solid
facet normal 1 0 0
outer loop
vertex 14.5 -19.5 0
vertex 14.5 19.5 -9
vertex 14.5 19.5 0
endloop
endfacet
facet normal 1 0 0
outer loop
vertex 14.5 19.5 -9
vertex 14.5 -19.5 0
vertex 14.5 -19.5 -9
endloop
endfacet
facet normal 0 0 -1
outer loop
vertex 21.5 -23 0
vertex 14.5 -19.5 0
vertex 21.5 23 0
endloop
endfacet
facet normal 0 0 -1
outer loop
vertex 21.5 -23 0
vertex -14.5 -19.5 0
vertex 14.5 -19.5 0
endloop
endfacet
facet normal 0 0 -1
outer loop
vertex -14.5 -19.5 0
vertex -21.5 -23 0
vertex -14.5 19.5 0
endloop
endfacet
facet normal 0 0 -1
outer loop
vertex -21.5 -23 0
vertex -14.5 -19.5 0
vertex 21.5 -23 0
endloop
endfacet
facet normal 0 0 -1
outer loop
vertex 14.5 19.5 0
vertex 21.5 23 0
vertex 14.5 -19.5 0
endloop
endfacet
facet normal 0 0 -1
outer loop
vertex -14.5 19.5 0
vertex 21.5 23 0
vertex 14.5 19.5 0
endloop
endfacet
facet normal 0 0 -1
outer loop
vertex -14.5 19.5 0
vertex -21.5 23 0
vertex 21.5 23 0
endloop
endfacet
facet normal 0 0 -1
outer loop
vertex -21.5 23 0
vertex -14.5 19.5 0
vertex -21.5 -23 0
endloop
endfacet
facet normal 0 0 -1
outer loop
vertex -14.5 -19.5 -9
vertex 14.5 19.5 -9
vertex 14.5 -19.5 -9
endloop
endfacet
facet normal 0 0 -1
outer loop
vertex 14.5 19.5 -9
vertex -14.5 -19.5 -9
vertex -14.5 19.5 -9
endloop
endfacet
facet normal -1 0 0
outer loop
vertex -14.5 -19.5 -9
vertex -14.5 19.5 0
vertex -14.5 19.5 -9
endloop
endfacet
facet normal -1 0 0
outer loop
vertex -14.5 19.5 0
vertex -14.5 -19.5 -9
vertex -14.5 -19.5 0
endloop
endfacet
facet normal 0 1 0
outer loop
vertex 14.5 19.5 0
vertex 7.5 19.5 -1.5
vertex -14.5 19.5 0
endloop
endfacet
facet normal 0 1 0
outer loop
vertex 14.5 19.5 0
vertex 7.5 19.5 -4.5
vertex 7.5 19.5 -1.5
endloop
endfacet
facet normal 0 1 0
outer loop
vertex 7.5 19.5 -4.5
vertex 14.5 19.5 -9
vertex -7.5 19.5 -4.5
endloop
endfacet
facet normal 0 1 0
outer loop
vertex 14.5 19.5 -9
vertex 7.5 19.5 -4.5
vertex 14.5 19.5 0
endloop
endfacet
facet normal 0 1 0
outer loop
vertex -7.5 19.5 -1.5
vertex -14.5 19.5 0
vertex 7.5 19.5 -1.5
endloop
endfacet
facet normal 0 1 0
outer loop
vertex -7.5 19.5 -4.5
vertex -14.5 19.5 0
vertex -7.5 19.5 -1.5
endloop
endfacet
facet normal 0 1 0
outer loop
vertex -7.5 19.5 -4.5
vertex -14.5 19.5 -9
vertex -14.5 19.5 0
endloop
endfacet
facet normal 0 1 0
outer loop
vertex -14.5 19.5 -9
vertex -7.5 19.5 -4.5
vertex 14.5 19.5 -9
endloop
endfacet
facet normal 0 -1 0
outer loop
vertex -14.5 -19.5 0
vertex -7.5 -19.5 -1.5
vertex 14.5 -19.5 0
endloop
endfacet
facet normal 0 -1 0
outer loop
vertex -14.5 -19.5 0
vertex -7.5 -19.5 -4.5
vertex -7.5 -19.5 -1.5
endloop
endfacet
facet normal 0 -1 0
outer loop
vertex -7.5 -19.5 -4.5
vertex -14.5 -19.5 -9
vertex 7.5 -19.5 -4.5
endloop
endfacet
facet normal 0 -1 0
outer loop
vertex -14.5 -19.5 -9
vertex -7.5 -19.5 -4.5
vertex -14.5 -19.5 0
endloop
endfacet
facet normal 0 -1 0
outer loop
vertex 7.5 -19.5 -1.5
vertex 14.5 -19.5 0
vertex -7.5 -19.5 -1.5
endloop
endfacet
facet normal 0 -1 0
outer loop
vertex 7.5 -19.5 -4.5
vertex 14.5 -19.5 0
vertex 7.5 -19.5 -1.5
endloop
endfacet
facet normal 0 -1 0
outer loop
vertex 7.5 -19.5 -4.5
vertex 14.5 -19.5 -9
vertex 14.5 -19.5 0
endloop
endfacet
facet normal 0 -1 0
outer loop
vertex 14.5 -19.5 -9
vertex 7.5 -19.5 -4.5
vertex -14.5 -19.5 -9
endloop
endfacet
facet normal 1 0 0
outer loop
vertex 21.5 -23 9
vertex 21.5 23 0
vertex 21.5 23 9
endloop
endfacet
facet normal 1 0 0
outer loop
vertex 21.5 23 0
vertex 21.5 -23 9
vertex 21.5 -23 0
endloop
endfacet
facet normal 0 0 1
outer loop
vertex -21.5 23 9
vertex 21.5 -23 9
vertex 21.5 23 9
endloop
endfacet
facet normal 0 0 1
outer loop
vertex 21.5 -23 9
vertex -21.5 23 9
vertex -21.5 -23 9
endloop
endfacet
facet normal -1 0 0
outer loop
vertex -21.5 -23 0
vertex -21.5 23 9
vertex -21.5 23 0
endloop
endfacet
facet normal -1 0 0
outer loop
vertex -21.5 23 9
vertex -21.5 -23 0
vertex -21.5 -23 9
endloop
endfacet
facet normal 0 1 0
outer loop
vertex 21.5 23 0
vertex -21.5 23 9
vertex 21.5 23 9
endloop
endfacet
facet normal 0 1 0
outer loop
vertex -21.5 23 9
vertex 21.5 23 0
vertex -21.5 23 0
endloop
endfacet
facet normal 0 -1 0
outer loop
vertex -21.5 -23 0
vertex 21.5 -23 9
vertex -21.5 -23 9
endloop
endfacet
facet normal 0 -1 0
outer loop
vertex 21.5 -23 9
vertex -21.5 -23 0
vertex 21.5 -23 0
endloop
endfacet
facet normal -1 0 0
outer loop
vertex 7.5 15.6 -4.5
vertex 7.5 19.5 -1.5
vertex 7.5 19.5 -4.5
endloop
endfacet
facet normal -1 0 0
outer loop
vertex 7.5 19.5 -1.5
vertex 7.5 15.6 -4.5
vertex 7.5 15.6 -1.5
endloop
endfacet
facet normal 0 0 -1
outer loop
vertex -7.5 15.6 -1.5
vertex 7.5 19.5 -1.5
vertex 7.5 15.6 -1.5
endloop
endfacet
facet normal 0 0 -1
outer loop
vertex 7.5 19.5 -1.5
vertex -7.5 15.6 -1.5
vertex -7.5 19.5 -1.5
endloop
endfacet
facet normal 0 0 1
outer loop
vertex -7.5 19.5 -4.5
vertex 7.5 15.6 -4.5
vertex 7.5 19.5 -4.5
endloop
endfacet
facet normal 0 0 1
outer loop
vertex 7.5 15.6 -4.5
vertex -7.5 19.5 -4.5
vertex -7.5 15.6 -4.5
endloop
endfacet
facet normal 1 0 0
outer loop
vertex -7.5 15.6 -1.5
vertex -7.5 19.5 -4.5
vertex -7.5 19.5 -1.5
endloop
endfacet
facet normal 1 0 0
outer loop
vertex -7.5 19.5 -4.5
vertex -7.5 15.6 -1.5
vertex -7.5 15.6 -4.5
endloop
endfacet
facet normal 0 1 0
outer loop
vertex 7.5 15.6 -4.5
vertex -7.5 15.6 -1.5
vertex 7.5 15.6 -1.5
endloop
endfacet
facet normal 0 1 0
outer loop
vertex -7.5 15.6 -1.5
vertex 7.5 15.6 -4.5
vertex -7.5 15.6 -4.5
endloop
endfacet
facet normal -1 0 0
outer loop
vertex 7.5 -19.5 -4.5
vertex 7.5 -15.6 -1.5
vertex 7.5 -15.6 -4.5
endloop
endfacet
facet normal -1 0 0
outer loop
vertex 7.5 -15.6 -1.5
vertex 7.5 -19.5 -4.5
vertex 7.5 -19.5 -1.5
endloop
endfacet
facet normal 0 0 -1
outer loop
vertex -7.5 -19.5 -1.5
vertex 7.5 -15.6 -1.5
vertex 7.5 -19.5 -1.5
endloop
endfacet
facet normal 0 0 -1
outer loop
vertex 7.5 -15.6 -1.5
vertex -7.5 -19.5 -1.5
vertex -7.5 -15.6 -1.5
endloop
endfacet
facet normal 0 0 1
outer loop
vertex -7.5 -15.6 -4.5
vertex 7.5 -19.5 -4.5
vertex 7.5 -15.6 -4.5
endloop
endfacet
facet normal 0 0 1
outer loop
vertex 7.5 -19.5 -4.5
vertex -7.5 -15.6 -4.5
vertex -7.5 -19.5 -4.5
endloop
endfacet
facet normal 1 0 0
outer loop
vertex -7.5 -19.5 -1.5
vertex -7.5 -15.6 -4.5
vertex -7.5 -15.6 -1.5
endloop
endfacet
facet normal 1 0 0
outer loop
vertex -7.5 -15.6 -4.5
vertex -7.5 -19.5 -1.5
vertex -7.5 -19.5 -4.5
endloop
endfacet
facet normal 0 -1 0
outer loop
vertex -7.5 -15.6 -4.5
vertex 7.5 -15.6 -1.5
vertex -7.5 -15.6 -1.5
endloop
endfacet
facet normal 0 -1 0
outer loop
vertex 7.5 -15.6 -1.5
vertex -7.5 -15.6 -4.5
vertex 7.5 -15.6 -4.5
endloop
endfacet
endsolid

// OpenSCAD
difference(){
union(){
    translate([0,0,-4.5])
    cube([29,39,9], center = true);
    translate([0,0,4.5])
    cube([43,46,9], center = true);
}
translate([0,(39-4)/2+0.1,4-9+4/2])
cube([15,4,3], center=true);
translate([0,-(39-4)/2-0.1,4-9+4/2])
cube([15,4,3], center=true);
}
